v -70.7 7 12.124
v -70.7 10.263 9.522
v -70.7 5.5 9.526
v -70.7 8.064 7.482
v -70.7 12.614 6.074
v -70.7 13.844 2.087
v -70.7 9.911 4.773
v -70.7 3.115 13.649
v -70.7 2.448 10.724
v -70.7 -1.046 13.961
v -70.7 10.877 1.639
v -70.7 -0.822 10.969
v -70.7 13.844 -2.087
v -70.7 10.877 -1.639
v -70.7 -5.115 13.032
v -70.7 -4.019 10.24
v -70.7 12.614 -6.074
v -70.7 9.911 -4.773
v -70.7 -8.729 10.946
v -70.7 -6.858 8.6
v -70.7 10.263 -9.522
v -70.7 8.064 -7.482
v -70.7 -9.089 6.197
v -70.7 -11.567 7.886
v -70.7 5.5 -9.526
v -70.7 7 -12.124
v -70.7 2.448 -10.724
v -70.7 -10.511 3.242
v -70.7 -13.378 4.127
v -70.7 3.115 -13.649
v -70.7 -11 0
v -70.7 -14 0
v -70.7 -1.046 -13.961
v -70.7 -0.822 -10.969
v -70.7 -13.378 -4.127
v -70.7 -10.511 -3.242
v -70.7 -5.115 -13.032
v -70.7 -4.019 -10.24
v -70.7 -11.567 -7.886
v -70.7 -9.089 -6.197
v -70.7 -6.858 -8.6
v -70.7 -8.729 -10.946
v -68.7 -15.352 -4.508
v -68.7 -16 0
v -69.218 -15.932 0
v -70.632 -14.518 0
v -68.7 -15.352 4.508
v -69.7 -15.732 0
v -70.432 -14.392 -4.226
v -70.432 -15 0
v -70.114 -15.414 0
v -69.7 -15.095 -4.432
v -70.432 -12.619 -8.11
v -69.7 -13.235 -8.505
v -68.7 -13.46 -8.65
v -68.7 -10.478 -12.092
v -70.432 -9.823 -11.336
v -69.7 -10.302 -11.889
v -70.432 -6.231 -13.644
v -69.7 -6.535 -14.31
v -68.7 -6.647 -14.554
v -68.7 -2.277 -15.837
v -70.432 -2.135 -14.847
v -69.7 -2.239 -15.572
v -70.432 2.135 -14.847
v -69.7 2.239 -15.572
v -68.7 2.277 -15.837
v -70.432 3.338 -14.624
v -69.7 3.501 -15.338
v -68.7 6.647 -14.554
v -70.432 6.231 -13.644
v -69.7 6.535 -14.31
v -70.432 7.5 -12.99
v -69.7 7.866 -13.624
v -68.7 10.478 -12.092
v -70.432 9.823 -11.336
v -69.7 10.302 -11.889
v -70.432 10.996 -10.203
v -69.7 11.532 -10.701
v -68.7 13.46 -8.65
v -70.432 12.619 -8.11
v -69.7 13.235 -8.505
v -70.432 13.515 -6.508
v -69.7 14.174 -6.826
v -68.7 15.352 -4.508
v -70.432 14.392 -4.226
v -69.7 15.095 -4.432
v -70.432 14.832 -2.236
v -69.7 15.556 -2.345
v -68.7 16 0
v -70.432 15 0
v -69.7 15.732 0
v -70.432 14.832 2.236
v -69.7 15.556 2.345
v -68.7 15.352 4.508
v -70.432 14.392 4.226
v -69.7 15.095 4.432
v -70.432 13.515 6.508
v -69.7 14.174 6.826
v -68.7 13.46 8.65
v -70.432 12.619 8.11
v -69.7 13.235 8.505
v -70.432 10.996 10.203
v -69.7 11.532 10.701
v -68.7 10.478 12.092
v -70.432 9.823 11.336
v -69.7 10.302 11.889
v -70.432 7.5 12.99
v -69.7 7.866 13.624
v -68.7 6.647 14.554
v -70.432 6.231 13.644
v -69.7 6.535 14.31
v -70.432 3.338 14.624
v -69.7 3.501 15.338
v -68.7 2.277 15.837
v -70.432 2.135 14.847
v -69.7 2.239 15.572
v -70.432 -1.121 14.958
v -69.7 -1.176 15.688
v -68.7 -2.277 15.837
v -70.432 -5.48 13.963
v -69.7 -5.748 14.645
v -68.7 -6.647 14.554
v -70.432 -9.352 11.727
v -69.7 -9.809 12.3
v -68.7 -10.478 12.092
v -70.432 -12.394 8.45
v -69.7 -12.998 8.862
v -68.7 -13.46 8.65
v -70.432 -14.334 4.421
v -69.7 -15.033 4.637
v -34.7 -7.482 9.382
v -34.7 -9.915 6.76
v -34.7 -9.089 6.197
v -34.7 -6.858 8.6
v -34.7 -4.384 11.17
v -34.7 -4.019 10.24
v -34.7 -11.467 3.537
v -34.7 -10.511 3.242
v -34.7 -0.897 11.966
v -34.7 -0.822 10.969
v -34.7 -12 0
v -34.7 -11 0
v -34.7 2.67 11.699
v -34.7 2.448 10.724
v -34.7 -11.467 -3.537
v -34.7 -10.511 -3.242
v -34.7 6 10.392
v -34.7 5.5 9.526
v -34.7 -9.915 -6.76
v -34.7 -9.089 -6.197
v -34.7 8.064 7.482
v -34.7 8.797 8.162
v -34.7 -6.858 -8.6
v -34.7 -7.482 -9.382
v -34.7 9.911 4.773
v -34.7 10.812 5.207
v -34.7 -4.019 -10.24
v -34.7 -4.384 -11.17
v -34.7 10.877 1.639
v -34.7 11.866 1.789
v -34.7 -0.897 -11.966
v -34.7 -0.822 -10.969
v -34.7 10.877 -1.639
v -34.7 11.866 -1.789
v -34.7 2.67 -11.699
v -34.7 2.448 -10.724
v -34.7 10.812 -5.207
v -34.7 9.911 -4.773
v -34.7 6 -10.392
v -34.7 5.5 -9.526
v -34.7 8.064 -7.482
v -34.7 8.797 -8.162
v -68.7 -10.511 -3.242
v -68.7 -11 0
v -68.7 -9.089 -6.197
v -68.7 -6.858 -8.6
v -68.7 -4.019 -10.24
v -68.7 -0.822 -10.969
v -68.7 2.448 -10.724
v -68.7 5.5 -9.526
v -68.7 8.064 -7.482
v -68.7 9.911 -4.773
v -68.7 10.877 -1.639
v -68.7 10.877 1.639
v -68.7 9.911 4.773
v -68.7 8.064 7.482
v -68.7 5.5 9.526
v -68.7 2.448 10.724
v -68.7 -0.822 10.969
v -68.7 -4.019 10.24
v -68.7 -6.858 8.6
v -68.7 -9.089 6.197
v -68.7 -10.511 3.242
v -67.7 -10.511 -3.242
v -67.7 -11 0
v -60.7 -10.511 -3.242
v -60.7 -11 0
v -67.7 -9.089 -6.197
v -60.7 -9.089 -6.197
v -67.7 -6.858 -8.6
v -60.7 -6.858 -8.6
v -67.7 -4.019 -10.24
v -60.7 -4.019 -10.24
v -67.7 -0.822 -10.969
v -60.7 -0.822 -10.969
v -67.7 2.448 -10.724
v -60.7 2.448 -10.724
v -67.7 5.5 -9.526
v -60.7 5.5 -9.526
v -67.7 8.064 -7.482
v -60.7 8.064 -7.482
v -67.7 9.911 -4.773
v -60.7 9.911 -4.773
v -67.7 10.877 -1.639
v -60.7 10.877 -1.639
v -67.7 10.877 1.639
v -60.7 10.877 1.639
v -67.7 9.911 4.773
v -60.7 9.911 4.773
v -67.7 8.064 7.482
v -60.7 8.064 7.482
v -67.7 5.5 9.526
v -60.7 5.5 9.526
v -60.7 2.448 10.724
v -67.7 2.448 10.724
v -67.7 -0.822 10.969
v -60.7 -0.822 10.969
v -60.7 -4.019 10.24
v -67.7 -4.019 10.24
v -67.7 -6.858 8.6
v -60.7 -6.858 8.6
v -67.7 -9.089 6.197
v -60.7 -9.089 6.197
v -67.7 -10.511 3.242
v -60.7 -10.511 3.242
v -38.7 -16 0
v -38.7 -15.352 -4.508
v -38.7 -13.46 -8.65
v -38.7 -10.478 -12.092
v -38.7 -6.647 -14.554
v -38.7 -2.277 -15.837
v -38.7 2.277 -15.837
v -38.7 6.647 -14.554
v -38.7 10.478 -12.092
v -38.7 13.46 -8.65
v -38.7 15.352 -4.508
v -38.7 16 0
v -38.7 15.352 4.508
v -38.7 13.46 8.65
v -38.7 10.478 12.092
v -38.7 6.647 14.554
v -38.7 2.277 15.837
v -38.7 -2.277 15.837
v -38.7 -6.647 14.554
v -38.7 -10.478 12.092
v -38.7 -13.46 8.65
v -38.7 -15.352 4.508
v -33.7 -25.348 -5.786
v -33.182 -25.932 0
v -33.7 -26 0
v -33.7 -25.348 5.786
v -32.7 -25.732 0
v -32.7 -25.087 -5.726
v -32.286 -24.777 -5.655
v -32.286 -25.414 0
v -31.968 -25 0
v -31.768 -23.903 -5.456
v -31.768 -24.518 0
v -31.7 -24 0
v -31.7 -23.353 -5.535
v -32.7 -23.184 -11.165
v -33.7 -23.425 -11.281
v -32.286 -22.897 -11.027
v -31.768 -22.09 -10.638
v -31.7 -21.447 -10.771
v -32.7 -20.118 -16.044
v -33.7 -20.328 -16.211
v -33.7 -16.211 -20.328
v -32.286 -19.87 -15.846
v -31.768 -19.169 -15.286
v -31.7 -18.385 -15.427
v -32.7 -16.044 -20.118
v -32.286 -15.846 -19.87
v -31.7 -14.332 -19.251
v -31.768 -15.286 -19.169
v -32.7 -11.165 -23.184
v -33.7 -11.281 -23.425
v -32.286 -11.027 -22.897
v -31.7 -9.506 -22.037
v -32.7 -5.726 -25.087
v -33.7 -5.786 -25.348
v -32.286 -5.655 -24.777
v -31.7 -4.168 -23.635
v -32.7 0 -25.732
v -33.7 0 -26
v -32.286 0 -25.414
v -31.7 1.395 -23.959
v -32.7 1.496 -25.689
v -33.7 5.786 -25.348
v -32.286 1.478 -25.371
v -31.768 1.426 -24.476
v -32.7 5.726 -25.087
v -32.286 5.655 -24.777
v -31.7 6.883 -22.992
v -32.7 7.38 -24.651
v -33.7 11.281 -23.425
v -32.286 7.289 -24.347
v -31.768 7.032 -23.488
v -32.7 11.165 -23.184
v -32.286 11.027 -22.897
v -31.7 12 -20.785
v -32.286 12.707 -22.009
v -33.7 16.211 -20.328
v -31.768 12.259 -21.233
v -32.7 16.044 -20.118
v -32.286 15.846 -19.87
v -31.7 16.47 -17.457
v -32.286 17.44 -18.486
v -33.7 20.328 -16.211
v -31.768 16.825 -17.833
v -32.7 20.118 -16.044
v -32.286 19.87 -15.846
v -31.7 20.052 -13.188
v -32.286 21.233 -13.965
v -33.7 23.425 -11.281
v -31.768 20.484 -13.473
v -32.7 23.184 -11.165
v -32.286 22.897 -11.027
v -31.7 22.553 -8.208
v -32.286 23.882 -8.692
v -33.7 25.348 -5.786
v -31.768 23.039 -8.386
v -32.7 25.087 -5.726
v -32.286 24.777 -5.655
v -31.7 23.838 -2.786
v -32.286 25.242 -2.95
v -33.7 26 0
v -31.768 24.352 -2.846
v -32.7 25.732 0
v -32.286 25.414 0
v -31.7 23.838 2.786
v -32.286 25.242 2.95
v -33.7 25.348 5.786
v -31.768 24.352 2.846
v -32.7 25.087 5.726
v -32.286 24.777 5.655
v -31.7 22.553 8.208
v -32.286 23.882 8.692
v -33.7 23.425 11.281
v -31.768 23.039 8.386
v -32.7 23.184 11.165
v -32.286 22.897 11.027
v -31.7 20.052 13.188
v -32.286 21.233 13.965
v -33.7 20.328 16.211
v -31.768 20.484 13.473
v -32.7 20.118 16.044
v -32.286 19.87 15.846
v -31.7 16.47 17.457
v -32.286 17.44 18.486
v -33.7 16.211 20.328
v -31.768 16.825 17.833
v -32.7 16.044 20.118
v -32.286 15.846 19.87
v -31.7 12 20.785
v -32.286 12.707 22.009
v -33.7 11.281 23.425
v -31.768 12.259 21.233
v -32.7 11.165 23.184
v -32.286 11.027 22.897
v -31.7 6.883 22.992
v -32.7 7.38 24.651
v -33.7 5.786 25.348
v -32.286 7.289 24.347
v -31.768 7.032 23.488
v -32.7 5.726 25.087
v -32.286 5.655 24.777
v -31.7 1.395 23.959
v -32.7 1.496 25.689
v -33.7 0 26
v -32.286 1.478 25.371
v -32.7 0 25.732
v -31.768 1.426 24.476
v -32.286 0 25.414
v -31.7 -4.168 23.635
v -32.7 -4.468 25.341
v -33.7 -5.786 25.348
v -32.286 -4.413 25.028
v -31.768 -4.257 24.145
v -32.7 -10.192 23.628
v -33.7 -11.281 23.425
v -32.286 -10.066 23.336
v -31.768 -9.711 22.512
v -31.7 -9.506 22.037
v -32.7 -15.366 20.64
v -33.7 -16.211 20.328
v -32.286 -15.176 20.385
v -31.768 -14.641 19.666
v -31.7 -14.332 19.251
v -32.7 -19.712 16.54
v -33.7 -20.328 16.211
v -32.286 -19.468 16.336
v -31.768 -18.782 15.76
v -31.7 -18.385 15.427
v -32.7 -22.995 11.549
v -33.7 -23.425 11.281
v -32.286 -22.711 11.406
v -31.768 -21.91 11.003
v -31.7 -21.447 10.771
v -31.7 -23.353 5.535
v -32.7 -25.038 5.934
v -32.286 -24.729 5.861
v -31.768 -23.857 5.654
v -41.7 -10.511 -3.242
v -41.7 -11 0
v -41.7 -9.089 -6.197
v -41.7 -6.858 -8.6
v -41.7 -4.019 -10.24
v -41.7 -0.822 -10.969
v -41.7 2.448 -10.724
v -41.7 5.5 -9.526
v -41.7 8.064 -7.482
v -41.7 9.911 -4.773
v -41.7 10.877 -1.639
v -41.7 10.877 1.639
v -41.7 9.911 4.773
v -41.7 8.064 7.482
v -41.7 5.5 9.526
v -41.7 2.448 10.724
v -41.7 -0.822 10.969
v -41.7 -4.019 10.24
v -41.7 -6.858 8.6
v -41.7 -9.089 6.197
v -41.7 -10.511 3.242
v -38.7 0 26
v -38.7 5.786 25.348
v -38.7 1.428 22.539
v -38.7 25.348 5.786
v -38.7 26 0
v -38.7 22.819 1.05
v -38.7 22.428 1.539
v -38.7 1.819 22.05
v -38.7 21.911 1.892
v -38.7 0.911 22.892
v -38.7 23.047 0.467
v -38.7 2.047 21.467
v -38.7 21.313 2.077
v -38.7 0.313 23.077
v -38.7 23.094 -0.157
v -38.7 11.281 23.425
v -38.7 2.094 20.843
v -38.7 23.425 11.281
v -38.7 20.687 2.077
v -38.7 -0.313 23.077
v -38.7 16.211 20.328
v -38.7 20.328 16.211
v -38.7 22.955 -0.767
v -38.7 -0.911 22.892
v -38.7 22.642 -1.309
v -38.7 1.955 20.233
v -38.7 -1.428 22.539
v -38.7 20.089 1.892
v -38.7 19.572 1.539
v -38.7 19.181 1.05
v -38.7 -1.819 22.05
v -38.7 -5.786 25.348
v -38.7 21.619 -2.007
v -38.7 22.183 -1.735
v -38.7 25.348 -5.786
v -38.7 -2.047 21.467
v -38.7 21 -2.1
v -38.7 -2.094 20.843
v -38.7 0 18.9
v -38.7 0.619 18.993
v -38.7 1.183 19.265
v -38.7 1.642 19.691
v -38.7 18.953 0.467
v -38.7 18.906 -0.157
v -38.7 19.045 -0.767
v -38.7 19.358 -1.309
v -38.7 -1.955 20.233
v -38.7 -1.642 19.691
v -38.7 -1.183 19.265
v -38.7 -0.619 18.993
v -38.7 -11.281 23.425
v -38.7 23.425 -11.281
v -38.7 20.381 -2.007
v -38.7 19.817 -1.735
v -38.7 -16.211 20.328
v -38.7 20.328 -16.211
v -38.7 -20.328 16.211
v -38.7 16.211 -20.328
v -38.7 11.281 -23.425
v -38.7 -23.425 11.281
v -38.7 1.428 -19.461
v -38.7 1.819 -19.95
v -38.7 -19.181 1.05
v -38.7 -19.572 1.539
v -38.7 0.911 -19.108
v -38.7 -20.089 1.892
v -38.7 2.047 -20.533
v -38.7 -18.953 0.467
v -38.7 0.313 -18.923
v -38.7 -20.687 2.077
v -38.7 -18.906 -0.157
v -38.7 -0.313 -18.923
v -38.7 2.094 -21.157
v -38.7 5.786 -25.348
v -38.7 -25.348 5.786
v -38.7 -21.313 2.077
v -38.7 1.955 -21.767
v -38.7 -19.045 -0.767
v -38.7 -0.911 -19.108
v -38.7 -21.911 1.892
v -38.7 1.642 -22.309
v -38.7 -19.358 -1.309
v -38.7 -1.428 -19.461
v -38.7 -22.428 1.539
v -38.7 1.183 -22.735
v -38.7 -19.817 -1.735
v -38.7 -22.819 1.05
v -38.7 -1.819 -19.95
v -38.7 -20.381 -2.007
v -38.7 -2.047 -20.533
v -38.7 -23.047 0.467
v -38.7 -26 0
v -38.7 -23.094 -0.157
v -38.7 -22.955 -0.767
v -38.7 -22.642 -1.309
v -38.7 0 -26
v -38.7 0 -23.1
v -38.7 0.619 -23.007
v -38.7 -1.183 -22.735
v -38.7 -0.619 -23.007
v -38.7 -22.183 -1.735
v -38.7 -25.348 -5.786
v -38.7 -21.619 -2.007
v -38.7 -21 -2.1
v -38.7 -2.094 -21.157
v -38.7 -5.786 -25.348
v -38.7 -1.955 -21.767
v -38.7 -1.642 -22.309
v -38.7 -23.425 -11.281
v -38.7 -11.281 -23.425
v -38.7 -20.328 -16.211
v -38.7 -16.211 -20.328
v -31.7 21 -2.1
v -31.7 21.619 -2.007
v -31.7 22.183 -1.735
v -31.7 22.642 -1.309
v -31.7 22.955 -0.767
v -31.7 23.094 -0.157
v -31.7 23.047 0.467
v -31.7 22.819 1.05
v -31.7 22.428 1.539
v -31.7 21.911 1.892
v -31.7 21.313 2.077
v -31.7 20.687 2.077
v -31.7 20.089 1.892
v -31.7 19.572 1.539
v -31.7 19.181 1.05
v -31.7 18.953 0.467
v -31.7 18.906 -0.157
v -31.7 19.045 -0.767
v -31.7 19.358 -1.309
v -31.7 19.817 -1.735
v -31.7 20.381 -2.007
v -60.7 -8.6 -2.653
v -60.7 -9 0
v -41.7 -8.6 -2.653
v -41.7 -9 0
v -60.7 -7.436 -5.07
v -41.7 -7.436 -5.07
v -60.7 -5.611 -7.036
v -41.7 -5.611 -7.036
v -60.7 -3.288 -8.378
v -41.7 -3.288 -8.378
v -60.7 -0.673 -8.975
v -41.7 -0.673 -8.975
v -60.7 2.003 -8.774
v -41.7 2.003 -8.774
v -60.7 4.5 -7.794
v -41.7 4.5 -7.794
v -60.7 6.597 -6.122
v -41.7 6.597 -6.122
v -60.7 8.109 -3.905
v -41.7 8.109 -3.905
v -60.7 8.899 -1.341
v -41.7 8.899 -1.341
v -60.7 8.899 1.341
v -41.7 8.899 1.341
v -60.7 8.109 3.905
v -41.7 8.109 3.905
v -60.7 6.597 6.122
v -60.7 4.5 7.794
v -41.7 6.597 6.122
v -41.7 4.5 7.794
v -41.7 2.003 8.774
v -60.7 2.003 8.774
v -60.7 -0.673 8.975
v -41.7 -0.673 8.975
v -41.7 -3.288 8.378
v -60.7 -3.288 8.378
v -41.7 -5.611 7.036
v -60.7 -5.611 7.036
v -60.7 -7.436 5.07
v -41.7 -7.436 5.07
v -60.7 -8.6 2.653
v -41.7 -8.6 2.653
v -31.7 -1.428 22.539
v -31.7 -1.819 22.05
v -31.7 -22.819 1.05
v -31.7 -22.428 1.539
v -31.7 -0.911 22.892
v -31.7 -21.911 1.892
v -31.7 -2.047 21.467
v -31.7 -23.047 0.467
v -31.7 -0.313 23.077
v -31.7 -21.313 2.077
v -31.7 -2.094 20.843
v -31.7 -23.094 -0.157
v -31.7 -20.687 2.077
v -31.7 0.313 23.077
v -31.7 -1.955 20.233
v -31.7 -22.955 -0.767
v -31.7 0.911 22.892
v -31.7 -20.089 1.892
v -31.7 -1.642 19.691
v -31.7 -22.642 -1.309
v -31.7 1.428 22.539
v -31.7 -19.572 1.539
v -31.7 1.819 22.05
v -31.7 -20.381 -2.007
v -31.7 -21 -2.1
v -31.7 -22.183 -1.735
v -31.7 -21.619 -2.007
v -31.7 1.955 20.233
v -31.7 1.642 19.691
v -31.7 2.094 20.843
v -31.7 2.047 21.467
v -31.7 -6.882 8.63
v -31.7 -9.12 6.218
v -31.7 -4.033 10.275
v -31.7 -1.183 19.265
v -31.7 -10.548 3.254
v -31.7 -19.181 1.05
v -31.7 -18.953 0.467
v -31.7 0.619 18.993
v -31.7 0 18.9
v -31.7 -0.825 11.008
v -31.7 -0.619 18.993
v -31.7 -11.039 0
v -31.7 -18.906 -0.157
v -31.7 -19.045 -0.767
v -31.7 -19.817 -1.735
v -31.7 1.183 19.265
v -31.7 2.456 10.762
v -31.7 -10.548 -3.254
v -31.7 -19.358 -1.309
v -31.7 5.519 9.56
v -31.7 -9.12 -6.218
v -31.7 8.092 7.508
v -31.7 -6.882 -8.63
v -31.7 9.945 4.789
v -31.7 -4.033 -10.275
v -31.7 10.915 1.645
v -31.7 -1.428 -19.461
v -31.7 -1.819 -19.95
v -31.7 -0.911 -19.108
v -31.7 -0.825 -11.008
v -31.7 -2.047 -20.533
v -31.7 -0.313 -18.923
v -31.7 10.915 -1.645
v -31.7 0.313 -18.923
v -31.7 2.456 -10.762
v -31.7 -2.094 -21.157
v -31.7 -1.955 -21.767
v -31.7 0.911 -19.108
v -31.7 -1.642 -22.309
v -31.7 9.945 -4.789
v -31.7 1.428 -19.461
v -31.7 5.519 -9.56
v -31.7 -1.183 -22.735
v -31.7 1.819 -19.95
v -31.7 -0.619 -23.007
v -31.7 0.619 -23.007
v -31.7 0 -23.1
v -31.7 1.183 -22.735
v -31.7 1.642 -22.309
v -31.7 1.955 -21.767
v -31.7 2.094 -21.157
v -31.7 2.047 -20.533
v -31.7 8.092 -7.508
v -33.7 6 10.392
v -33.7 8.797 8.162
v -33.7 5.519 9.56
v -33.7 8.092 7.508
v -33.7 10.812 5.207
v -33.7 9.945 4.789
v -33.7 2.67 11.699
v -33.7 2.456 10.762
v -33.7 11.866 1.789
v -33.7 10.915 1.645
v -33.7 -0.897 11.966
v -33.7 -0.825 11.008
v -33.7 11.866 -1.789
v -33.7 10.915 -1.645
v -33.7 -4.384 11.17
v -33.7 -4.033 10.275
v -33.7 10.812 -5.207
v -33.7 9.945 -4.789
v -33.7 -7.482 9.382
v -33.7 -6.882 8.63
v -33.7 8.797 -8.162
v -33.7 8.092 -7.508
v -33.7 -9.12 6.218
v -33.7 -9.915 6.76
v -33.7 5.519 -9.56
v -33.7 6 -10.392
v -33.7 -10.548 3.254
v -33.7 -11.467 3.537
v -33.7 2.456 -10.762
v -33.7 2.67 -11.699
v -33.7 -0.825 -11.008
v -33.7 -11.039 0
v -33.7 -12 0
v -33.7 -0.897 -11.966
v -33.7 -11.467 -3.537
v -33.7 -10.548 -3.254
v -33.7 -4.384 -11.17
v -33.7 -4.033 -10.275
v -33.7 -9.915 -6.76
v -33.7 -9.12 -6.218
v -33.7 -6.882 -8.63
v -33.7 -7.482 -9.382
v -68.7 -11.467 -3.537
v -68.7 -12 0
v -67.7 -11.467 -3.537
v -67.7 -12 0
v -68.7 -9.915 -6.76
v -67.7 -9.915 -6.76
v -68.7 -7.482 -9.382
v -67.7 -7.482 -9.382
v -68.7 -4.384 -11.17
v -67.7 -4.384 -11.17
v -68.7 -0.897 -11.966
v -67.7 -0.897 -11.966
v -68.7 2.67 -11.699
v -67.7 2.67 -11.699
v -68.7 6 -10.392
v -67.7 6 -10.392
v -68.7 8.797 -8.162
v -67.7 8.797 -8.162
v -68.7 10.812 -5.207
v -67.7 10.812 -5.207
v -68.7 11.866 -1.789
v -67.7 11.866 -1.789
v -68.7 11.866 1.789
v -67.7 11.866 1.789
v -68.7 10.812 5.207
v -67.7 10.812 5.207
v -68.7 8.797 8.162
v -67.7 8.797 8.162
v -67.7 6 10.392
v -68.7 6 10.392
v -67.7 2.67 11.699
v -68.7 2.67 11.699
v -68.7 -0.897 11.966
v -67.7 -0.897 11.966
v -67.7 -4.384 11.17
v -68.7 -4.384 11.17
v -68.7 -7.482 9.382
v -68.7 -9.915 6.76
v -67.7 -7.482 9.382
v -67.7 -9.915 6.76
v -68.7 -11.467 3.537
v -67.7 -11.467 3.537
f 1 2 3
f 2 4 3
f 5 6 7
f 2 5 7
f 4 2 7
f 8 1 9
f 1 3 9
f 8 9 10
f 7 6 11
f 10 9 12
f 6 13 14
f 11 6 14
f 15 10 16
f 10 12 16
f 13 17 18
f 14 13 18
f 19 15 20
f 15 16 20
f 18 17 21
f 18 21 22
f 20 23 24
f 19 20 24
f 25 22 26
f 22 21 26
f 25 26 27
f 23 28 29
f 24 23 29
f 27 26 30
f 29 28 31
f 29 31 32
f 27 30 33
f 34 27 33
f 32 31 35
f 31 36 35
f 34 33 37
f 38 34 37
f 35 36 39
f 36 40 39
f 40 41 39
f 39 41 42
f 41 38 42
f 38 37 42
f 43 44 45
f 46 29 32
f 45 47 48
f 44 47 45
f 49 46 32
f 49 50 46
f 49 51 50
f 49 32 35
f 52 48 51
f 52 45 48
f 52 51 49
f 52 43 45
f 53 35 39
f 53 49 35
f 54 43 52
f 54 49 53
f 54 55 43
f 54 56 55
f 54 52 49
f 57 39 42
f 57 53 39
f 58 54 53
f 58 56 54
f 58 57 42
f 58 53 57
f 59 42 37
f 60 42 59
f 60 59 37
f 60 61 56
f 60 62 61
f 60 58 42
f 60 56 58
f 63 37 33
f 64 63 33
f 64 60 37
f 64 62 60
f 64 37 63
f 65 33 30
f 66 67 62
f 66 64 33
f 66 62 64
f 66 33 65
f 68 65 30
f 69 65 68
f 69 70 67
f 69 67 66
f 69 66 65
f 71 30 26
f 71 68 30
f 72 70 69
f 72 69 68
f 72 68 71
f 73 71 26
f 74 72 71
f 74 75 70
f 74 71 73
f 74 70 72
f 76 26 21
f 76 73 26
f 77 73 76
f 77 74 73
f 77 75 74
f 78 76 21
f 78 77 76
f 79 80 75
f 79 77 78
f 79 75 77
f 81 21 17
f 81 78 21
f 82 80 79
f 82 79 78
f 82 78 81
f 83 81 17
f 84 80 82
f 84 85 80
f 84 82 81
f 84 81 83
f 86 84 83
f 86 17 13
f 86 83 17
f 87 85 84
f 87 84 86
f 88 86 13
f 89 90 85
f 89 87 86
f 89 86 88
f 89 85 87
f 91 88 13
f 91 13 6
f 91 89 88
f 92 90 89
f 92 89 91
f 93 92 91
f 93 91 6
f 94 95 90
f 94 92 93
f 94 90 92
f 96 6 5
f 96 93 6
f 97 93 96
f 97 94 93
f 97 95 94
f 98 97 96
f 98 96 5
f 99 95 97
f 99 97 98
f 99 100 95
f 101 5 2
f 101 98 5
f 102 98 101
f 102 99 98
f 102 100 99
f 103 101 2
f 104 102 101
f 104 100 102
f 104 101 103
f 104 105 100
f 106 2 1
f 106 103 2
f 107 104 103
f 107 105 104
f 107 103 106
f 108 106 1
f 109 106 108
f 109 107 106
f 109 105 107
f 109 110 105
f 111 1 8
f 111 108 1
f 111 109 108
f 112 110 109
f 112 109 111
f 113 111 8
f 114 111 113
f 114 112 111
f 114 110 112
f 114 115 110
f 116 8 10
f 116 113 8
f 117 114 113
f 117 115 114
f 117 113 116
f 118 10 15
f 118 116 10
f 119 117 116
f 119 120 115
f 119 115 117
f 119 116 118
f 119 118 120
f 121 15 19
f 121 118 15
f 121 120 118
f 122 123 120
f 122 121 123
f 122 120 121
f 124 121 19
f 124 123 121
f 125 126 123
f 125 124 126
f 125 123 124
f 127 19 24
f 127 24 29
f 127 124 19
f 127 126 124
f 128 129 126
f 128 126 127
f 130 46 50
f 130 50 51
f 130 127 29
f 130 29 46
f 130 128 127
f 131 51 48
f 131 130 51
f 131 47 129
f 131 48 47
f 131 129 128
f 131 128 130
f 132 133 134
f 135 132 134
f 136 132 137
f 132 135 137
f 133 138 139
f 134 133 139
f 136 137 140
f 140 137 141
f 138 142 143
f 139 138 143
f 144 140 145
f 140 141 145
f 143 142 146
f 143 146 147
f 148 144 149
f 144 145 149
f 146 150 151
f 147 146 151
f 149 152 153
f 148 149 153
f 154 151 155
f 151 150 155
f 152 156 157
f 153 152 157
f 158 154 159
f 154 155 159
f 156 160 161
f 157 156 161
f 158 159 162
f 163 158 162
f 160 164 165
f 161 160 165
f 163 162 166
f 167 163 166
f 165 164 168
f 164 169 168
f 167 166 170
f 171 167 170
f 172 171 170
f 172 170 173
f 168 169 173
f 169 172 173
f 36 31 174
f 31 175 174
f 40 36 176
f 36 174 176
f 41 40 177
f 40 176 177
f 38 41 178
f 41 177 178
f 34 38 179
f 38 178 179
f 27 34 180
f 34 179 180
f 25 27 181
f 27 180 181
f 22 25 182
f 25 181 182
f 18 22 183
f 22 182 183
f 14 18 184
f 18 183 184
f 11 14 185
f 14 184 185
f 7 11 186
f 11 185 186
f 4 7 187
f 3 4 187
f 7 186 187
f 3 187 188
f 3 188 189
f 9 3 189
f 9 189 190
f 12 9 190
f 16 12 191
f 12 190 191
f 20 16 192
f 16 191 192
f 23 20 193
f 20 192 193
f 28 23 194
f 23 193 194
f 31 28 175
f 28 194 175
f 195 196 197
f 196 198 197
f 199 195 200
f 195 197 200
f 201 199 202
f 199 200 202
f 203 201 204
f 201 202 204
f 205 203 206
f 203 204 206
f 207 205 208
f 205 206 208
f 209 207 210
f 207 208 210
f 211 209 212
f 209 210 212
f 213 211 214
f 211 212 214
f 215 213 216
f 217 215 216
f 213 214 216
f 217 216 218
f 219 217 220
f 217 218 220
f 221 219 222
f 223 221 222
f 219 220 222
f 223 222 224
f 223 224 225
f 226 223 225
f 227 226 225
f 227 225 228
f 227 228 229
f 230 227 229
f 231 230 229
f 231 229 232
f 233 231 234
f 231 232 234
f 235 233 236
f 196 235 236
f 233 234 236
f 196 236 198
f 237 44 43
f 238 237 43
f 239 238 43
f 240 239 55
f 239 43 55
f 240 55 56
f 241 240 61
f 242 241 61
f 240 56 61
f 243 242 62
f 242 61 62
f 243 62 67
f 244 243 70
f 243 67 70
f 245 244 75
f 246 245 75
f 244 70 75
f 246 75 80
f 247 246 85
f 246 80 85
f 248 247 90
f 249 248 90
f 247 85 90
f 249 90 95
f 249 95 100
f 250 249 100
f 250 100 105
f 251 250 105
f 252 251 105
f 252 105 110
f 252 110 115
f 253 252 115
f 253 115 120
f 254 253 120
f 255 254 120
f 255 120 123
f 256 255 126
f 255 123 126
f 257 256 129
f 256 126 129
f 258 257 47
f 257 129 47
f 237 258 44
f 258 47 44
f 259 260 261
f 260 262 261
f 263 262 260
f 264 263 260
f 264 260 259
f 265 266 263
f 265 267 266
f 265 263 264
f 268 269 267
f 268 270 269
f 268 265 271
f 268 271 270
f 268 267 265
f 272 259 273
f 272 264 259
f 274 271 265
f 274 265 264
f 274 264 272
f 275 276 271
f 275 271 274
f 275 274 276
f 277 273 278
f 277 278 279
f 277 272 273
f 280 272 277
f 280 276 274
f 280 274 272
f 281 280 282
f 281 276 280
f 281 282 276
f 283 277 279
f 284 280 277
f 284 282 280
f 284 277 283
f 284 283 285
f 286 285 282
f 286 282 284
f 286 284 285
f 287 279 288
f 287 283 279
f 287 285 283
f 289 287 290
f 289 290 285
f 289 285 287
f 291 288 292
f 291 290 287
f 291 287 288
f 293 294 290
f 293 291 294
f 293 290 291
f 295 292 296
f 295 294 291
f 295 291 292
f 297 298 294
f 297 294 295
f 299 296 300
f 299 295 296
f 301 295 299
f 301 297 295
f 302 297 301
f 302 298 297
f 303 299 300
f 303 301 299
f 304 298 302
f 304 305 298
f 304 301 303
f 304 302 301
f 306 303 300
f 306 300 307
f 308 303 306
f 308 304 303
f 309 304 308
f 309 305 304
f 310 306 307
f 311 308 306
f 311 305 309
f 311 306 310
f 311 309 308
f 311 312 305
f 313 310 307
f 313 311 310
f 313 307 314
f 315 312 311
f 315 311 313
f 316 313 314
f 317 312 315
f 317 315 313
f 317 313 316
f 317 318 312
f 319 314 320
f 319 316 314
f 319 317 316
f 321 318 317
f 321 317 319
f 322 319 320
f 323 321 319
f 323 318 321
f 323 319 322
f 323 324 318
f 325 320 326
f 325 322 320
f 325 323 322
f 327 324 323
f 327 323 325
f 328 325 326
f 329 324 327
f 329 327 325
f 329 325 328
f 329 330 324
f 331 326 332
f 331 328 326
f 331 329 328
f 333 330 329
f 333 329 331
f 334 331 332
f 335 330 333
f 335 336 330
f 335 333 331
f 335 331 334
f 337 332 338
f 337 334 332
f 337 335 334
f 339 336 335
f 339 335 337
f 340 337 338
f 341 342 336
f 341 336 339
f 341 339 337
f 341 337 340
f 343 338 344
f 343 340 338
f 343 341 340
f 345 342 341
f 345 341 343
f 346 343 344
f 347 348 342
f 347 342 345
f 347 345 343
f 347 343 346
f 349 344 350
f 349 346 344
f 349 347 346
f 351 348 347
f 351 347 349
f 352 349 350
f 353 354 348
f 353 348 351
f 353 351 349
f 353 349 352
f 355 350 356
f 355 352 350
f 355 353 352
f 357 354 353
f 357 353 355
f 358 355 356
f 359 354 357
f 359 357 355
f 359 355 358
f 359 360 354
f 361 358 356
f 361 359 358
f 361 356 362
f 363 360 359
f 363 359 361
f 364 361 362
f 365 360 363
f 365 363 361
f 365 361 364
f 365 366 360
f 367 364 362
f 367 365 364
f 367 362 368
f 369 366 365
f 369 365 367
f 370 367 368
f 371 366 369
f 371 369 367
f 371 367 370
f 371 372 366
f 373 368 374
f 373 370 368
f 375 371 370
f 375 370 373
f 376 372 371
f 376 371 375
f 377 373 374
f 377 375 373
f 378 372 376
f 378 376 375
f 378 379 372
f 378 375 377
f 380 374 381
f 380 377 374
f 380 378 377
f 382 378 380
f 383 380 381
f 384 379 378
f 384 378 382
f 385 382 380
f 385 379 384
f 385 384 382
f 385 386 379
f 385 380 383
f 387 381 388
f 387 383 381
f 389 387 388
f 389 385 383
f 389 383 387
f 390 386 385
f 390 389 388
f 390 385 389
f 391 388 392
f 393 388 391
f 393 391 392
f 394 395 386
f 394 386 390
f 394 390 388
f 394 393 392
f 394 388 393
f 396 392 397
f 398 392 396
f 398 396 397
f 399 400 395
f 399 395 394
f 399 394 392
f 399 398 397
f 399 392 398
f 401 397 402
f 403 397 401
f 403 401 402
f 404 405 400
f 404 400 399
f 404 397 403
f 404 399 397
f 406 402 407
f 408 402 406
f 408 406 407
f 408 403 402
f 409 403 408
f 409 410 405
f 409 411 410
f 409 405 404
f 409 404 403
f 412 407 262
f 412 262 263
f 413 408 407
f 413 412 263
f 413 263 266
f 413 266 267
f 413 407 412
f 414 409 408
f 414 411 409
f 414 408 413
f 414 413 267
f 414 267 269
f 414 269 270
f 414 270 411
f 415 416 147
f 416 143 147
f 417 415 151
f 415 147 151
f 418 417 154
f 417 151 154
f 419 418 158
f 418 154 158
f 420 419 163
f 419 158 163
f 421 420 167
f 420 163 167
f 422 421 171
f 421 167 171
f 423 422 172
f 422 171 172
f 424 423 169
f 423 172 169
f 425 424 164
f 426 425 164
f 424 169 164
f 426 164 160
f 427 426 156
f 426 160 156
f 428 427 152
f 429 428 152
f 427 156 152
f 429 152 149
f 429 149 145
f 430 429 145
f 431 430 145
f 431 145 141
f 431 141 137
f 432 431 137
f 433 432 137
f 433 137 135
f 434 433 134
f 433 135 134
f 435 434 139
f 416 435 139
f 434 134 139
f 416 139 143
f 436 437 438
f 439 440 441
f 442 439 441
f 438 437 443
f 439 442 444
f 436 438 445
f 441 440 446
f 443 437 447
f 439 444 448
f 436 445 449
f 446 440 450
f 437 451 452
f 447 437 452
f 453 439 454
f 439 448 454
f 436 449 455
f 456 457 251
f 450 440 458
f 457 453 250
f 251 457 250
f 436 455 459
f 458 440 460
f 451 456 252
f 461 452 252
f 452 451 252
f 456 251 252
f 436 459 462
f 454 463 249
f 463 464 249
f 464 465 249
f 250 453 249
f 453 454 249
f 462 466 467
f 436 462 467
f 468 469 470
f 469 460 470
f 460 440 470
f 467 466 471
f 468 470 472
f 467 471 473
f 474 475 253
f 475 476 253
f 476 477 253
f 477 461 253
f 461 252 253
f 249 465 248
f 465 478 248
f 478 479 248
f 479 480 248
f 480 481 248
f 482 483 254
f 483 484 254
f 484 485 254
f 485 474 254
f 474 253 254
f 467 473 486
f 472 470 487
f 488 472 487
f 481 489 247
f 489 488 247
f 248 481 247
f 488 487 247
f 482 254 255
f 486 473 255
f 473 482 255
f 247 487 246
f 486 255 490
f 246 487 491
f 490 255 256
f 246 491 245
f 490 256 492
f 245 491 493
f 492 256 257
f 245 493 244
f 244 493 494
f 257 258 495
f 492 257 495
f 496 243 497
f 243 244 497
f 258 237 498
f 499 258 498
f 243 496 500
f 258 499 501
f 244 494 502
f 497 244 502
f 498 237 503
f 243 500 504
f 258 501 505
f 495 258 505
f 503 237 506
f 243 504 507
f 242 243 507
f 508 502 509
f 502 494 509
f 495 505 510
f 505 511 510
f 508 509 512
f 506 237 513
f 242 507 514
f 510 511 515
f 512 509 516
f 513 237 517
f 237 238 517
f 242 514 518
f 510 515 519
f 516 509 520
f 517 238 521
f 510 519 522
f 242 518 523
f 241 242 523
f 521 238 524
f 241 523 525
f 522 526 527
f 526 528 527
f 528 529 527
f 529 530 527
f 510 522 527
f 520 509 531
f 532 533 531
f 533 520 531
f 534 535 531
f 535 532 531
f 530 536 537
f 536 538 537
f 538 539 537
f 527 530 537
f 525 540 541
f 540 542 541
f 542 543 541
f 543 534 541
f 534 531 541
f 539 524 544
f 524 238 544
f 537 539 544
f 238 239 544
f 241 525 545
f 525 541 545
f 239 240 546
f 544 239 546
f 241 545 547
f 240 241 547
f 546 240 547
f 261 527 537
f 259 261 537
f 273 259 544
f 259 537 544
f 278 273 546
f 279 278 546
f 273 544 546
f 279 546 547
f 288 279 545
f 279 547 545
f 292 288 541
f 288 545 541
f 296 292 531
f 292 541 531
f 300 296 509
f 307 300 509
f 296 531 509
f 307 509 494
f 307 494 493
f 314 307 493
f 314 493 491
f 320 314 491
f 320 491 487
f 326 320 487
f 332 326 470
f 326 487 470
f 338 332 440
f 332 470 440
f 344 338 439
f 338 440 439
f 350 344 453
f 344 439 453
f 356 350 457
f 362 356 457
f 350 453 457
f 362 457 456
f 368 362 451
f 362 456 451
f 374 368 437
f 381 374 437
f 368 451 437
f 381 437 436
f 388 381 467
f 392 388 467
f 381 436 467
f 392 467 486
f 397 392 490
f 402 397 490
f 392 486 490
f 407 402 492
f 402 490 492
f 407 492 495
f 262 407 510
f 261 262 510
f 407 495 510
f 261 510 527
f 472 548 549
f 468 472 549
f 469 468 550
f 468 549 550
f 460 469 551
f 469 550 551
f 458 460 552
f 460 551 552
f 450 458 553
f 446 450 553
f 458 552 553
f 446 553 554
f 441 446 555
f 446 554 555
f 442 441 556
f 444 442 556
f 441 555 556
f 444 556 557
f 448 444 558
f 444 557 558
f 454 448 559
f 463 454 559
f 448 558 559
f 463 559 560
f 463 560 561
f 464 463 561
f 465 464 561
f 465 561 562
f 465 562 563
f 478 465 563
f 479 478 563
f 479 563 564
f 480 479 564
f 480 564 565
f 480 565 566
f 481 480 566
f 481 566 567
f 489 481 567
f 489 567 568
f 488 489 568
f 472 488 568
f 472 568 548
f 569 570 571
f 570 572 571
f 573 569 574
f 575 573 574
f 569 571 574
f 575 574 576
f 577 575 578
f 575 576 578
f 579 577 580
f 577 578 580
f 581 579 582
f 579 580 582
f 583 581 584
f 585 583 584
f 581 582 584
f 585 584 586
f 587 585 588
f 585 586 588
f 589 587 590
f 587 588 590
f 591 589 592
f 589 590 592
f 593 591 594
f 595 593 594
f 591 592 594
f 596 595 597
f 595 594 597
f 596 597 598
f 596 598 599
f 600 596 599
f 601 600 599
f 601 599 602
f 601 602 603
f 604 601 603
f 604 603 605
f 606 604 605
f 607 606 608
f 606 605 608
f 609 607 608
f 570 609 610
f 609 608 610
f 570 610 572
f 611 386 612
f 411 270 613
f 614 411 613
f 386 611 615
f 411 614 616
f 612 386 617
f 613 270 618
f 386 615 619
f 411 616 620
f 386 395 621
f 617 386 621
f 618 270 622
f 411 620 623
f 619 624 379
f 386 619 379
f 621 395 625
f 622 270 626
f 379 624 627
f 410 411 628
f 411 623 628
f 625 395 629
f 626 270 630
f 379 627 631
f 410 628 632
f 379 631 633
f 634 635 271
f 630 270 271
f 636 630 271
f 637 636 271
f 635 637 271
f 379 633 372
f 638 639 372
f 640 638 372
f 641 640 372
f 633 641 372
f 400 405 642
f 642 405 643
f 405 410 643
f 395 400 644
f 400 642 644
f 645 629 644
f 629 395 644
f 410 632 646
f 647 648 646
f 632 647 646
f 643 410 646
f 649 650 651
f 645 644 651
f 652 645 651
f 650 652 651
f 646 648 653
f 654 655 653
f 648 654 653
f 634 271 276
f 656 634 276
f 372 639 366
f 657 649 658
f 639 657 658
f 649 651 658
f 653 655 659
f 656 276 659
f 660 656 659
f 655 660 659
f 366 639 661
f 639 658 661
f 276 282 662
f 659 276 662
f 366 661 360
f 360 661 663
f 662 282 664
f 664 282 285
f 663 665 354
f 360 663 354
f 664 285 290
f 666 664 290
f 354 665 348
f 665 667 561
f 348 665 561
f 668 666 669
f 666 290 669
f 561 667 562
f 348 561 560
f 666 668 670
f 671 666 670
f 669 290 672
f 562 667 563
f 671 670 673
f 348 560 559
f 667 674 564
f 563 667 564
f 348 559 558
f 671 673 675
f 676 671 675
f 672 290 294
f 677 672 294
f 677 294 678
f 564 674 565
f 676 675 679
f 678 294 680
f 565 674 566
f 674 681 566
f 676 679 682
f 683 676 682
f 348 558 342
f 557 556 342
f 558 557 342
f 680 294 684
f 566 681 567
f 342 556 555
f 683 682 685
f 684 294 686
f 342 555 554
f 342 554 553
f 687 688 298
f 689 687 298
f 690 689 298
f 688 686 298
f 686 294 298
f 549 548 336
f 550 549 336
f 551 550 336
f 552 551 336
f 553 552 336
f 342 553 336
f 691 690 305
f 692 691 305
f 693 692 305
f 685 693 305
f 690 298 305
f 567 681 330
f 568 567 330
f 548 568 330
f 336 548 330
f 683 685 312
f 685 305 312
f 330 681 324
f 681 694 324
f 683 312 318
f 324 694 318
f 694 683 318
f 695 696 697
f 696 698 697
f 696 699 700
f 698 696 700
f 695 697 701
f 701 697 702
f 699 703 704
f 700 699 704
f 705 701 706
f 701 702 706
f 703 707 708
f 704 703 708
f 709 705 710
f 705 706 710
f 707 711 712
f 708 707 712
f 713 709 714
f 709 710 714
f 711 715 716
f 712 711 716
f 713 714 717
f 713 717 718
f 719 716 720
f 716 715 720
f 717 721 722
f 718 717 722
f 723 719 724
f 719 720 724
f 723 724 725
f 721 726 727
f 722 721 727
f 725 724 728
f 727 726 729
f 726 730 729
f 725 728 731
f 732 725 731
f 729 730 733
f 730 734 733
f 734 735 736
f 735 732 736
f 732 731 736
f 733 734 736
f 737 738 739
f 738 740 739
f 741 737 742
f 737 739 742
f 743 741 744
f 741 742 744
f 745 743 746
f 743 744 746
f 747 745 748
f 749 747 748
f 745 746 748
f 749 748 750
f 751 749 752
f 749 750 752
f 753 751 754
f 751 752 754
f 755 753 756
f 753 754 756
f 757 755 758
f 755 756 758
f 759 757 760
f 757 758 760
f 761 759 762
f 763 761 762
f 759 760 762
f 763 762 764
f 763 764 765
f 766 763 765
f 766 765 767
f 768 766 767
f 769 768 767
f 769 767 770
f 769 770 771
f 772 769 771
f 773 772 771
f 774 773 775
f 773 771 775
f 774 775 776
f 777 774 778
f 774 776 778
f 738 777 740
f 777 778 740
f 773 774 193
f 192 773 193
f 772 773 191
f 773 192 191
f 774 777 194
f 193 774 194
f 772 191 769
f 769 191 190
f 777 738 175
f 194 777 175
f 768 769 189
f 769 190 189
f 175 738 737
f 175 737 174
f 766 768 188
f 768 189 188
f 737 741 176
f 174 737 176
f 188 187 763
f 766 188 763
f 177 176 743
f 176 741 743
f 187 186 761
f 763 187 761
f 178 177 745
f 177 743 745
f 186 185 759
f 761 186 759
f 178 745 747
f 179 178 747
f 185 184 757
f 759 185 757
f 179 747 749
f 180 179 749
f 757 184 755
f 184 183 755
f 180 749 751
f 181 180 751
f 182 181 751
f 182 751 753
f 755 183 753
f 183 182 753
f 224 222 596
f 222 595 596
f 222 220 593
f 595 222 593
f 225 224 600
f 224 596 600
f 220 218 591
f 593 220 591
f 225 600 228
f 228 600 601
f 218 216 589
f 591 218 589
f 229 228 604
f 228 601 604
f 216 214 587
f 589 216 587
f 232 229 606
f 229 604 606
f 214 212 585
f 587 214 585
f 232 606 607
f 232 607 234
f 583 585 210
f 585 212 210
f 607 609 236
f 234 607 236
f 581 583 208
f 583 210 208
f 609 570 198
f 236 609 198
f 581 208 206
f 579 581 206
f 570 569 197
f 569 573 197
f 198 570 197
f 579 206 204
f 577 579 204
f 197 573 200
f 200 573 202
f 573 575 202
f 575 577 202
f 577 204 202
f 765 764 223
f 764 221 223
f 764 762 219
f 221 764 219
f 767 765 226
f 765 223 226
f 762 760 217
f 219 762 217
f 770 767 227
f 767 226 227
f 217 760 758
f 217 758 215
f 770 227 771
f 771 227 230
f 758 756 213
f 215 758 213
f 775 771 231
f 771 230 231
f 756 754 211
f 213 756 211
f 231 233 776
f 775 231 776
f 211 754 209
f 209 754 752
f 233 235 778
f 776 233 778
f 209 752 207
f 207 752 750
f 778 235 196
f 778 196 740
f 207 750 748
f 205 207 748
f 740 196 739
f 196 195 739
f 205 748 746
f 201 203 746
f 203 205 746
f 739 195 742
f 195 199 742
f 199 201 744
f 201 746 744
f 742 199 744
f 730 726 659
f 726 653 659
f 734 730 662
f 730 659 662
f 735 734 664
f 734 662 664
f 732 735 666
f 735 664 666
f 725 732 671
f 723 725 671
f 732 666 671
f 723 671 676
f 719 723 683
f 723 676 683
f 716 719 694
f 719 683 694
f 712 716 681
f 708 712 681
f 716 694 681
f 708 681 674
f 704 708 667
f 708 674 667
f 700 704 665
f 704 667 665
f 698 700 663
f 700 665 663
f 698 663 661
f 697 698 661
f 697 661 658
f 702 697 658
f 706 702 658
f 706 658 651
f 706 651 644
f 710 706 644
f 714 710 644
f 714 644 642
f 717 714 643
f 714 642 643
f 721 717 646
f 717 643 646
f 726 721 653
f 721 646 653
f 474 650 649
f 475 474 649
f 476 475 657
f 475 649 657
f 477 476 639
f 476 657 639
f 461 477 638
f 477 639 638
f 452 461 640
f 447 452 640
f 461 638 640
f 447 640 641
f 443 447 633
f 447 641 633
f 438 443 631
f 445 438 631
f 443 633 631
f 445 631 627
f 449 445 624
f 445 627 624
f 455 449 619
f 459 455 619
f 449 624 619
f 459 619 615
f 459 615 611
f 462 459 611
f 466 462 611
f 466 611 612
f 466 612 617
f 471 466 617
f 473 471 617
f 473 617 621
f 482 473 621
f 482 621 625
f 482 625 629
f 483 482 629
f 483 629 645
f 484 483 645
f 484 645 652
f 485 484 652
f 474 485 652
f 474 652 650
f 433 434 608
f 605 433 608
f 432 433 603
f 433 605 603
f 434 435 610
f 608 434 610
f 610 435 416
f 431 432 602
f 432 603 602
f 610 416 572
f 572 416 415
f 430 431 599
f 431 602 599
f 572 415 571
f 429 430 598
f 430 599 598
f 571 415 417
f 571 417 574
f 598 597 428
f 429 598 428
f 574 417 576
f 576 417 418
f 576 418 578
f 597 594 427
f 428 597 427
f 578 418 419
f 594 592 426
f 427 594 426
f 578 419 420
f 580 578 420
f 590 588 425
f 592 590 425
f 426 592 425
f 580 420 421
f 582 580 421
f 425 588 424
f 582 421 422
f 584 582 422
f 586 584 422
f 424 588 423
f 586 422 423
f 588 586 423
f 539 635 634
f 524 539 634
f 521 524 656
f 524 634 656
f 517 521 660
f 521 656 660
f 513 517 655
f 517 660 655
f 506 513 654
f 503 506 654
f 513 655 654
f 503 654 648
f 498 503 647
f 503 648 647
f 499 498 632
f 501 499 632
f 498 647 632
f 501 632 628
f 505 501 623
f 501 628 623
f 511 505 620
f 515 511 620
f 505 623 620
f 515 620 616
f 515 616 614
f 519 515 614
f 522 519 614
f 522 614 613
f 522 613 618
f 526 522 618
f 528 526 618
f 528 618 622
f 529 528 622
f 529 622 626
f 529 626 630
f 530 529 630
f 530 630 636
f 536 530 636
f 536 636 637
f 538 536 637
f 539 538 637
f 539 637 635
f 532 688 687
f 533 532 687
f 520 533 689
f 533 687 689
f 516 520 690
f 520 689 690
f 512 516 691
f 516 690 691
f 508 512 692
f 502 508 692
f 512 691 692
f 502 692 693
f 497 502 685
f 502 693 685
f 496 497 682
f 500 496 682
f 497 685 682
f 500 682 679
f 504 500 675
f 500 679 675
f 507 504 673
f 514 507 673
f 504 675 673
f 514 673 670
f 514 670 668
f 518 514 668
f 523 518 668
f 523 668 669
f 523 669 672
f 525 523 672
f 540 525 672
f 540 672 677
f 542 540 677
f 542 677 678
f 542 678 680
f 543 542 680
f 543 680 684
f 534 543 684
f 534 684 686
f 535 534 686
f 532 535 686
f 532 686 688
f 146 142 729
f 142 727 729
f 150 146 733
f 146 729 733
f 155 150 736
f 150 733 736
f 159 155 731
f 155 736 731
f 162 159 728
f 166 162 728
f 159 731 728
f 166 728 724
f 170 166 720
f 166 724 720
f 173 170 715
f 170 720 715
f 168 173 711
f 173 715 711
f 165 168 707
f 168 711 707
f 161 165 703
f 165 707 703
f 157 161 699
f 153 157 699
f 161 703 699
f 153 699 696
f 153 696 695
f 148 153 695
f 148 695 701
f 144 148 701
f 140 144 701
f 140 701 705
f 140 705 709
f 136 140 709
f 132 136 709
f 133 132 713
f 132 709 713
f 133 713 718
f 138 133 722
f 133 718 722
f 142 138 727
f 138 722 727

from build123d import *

# Parameters (mm, degrees)
SKETCH2_R          = 2.1
CUT_EXTRUDE1_DEPTH = 54.600373133
FILLET1_R          = 2


with BuildPart() as part:
    # Sketch1 → Revolve1 (revolve)
    with BuildSketch(Plane.XY, mode=Mode.PRIVATE) as revolve1_sk:
        Polygon((-70.7, 11), (-68.7, 11), (-68.7, 12), (-67.7, 12), (-67.7, 11), (-60.7, 11), (-60.7, 9), (-41.7, 9), (-41.7, 11), (-34.7, 11), (-34.7, 12), (-33.7, 12), (-33.7, 11.038518603), (-31.7, 11.038518603), (-31.7, 26), (-38.7, 26), (-38.7, 16), (-70.7, 16), align=None)
    revolve(revolve1_sk.sketch.rotate(Axis((-70.7, 0, 0), (1, 0, 0)), 180), axis=Axis((-70.7, 0, 0), (1, 0, 0)))

    # Sketch2 → Cut-Extrude1 (cut, through all)
    with BuildSketch(Plane(origin=(-31.7, 0, 0), x_dir=(0, 0, -1), z_dir=(1, 0, 0))):
        with Locations((0, 21)):
            Circle(SKETCH2_R)
        with Locations((21, 0)):
            Circle(SKETCH2_R)
        with Locations((0, -21)):
            Circle(SKETCH2_R)
        with Locations((-21, 0)):
            Circle(SKETCH2_R)
    extrude(amount=-CUT_EXTRUDE1_DEPTH, mode=Mode.SUBTRACT)

    # Fillet1
    fillet1_edges = [part.edges().sort_by_distance(p)[0] for p in [
        (-70.7, 16, 0),
        (-31.7, 26, 0),
    ]]
    fillet(fillet1_edges, radius=FILLET1_R)


solid = part.part
